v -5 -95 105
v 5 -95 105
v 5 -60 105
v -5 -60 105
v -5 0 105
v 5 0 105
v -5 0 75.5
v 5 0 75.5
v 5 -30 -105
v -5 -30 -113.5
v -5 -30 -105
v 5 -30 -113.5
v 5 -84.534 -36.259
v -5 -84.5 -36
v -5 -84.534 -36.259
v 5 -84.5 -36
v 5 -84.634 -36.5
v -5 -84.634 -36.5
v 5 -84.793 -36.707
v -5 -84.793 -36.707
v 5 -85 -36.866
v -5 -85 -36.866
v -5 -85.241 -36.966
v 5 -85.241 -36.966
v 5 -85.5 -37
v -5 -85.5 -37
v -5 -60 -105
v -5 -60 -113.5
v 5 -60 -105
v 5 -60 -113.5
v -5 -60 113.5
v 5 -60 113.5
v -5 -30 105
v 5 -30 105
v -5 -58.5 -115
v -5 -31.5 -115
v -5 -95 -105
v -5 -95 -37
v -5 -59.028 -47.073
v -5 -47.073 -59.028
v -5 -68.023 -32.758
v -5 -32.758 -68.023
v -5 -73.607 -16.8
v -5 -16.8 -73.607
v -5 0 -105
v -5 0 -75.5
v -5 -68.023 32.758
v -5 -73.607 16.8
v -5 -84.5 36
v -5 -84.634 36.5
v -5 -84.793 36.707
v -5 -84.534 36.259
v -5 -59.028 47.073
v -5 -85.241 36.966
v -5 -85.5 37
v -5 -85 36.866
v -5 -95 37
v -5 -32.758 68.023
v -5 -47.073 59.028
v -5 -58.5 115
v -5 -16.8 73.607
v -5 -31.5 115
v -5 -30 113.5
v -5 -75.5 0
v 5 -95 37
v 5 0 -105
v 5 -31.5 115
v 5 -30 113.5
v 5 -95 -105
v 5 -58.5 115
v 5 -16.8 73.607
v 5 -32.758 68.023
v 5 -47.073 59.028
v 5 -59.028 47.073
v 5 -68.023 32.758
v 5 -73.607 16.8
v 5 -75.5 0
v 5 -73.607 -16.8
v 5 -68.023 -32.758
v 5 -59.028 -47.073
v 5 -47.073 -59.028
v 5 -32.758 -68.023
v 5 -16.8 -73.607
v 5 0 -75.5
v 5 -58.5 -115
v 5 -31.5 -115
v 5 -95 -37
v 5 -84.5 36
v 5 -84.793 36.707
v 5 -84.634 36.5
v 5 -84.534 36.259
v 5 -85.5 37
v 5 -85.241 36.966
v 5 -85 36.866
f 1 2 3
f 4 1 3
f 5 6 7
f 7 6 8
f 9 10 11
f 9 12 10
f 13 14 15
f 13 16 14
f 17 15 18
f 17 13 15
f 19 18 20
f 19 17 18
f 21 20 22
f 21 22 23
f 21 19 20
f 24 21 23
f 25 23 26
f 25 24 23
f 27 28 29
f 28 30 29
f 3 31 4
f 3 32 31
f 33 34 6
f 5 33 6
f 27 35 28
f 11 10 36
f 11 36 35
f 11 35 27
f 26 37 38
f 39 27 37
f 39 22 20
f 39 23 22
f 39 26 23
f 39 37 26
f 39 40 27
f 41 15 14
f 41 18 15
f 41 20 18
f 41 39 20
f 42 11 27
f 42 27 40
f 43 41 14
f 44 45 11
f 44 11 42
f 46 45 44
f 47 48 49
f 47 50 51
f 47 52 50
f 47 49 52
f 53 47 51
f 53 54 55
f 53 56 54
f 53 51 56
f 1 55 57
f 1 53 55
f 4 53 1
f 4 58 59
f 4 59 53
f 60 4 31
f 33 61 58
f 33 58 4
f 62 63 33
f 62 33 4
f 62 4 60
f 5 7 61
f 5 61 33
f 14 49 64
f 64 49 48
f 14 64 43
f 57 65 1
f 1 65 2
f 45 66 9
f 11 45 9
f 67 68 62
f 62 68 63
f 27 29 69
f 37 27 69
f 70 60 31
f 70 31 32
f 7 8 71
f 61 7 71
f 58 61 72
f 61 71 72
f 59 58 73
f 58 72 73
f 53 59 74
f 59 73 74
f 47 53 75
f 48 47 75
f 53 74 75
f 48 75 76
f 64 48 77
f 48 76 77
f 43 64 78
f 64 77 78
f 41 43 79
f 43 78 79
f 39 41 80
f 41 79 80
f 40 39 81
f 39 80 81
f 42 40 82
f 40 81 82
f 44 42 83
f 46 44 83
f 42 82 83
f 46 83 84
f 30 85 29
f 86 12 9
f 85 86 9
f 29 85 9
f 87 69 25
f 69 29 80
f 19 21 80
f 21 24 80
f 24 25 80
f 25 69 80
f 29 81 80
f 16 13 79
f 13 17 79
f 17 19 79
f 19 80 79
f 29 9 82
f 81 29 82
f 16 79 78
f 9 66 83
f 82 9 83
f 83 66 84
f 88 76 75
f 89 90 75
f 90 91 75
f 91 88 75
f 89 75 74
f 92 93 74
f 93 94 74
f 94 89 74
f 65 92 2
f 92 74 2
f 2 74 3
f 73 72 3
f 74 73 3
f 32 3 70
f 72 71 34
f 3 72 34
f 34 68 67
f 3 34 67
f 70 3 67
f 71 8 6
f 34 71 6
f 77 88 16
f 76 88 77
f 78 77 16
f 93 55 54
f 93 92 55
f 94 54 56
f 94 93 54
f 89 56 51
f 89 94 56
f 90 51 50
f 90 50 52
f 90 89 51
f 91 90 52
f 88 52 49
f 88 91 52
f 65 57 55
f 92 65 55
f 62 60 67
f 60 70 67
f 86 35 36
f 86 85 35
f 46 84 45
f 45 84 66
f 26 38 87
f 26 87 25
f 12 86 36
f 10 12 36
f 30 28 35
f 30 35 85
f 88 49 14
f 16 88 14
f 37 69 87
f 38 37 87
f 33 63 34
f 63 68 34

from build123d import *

# Parameters (mm, degrees)
EXTRUDE_754_DEPTH              = 5
SKETCH_2_W                     = 10
SKETCH_2_H                     = 30
EXTRUDE_813_DEPTH              = 5
CHAMFER_861_SIZE               = 1.5
CHAMFER_861_OF_MIRROR_928_SIZE = 1.5
CUT_EXTRUDE_956_DEPTH          = 150.248115566
CUT_EXTRUDE_956_DEPTH_BACK     = 150.248115566
SKETCH_3_W                     = 74
SKETCH_3_H                     = 10.5
FILLET_R_R                     = 1


with BuildPart() as part:
    # ｽｹｯﾁ1 → Extrude 754 (new, symmetric)
    with BuildSketch(Plane(origin=(0, 0, 0), x_dir=(0, 0, -1), z_dir=(1, 0, 0))):
        with BuildLine():
            Line((75.5, 0), (105, 0))
            Line((105, 0), (105, -95))
            Line((105, -95), (-105, -95))
            Line((-105, -95), (-105, 0))
            Line((-105, 0), (-75.5, 0))
            ThreePointArc((-75.5, 0), (0, -75.5), (75.5, 0))
        make_face()
    extrude(amount=EXTRUDE_754_DEPTH, both=True)

    # ｽｹｯﾁ2 → Extrude 813 (add, symmetric)
    with BuildSketch(Plane(origin=(0, 0, 0), x_dir=(0, 0, -1), z_dir=(1, 0, 0))):
        with Locations((-110, -45)):
            Rectangle(SKETCH_2_W, SKETCH_2_H)
    extrude_813 = extrude(amount=EXTRUDE_813_DEPTH, both=True)

    # Chamfer 861
    chamfer_861_edges = [part.edges().sort_by_distance(p)[0] for p in [
        (0, -30, 115),
        (0, -60, 115),
    ]]
    chamfer(chamfer_861_edges, length=CHAMFER_861_SIZE)

    # Mirror 928: Extrude 813 across plane
    add(extrude_813.mirror(Plane.XY))

    # Chamfer 861 of Mirror 928
    chamfer_861_of_mirror_928_edges = [part.edges().sort_by_distance(p)[0] for p in [
        (0, -30, -115),
        (0, -60, -115),
    ]]
    chamfer(chamfer_861_of_mirror_928_edges, length=CHAMFER_861_OF_MIRROR_928_SIZE)

    # ｽｹｯﾁ3 → Cut-Extrude 956 (cut, two sides: drawn at the far end of the back side and taken through both)
    with BuildSketch(Plane(origin=(0, 0, 0), x_dir=(0, 0, -1), z_dir=(1, 0, 0)).offset(-CUT_EXTRUDE_956_DEPTH_BACK)):
        with Locations((0, -89.75)):
            Rectangle(SKETCH_3_W, SKETCH_3_H)
    extrude(amount=CUT_EXTRUDE_956_DEPTH + CUT_EXTRUDE_956_DEPTH_BACK, mode=Mode.SUBTRACT)

    # くぐり穴 内角R
    fillet_r_edges = [part.edges().sort_by_distance(p)[0] for p in [
        (0, -84.5, -37),
        (0, -84.5, 37),
    ]]
    fillet(fillet_r_edges, radius=FILLET_R_R)


solid = part.part
